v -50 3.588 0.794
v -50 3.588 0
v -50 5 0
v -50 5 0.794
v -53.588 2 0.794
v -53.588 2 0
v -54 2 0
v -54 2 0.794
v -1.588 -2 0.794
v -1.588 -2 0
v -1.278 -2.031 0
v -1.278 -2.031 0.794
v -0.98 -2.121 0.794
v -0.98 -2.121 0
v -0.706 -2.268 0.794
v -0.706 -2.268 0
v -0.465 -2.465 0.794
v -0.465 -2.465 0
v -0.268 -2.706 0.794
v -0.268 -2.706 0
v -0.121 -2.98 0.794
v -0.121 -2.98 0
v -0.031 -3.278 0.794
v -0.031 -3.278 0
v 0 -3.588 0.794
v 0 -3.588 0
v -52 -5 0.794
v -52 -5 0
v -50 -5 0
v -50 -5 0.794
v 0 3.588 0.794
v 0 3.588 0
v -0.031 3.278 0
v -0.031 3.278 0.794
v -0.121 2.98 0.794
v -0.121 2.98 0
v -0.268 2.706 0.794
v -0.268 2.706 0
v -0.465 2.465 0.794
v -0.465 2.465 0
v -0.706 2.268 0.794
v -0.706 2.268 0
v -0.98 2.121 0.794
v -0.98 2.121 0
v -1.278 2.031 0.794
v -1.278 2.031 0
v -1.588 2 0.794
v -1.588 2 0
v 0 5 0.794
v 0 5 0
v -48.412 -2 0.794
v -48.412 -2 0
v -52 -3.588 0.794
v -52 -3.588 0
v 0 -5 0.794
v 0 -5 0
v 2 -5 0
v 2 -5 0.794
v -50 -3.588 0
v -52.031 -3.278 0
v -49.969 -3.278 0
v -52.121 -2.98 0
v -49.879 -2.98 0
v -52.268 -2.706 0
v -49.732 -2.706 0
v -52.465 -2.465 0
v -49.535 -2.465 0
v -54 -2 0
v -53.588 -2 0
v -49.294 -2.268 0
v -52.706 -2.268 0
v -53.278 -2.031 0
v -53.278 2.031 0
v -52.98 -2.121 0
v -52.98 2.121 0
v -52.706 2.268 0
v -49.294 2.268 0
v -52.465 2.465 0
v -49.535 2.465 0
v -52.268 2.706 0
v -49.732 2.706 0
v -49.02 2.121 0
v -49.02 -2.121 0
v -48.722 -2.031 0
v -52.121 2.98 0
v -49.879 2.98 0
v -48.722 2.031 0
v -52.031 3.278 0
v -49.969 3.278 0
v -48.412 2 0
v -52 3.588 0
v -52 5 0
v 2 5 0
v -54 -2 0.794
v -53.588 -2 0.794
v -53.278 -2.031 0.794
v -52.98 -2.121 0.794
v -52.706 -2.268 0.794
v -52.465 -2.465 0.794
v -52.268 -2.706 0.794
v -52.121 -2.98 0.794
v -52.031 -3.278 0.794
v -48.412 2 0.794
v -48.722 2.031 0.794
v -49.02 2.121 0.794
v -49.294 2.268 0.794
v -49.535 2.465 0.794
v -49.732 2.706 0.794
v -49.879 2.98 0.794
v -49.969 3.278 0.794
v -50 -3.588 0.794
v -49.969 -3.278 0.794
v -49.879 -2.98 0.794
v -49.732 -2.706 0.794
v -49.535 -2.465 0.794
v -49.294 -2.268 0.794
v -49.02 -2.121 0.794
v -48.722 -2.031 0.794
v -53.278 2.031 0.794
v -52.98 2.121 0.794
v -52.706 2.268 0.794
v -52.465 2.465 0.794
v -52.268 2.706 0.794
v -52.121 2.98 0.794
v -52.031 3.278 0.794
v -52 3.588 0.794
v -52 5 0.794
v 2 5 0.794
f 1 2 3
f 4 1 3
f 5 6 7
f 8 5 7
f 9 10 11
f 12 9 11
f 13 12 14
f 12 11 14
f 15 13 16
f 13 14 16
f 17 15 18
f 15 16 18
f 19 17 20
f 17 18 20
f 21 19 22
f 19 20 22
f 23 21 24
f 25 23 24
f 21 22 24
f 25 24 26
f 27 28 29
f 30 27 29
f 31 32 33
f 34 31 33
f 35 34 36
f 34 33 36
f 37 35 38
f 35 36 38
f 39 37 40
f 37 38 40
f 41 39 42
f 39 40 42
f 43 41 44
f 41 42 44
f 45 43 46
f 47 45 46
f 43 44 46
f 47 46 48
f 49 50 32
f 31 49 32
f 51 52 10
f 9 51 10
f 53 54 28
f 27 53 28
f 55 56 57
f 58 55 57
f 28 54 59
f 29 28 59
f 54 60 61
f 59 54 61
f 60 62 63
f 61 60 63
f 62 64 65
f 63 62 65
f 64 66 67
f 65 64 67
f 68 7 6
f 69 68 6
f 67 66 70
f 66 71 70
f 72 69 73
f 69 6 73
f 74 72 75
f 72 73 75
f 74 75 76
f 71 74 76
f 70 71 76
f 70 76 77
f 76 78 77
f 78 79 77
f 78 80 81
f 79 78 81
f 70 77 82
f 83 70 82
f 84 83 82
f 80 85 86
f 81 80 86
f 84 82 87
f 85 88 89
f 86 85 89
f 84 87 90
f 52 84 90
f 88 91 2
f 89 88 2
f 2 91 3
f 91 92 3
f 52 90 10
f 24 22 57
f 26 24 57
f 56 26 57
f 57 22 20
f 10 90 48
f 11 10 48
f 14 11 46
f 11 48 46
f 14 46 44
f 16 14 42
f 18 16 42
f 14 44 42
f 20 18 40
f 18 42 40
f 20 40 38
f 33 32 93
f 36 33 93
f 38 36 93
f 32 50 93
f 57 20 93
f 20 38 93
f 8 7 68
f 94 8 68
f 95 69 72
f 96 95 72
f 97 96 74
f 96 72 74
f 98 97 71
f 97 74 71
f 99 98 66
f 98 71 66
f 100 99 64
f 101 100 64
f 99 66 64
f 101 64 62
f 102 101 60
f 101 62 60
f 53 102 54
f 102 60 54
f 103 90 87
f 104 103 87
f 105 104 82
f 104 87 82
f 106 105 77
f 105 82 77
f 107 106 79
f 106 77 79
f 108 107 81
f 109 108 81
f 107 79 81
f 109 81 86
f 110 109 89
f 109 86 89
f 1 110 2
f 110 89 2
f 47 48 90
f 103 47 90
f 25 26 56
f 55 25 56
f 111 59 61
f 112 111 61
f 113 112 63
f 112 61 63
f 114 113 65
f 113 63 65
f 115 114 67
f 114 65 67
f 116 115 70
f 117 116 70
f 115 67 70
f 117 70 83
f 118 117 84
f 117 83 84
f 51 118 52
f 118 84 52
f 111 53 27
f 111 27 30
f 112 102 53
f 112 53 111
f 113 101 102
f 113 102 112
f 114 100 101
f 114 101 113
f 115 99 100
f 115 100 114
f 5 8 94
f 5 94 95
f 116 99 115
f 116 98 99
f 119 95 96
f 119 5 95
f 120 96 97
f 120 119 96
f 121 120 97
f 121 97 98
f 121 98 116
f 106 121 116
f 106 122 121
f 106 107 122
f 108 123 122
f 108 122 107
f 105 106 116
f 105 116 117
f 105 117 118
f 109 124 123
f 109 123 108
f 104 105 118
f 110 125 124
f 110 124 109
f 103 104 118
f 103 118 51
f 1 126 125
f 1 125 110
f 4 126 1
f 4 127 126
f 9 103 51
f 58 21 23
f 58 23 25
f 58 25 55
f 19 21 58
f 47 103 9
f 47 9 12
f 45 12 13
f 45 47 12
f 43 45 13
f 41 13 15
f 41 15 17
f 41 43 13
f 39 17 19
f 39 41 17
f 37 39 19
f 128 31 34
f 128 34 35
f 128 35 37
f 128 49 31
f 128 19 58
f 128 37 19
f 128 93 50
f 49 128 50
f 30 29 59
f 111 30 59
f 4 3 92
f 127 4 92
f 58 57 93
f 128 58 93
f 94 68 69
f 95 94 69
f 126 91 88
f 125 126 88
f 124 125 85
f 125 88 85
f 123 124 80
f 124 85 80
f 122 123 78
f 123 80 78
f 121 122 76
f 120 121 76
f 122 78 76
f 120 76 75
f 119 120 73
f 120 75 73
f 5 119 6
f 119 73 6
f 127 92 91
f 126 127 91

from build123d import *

# Parameters (mm, degrees)
F1_DEPTH = 0.79375


# Not quite as in the source:
# - a length typed as a fraction of an inch, garbled in the dataset ("3 / 203.2 mm" for 3/8 in), is restored


with BuildPart() as f1:
    # F0 (on Top) → F1 (new body)
    with BuildSketch(Plane.XY):
        with BuildLine():
            ThreePointArc((0, 3.5875), (-0.4649679849, 2.4649679849), (-1.5875, 2))
            Line((-1.5875, 2), (-48.4125, 2))
            ThreePointArc((-48.4125, 2), (-49.5350320151, 2.4649679849), (-50, 3.5875))
            Line((-50, 3.5875), (-50, 5))
            Line((-50, 5), (-52, 5))
            Line((-52, 5), (-52, 3.5875))
            ThreePointArc((-52, 3.5875), (-52.4649679849, 2.4649679849), (-53.5875, 2))
            Line((-53.5875, 2), (-54, 2))
            Line((-54, 2), (-54, -2))
            Line((-54, -2), (-53.5875, -2))
            ThreePointArc((-53.5875, -2), (-52.4649679849, -2.4649679849), (-52, -3.5875))
            Line((-52, -3.5875), (-52, -5))
            Line((-52, -5), (-50, -5))
            Line((-50, -5), (-50, -3.5875))
            ThreePointArc((-50, -3.5875), (-49.5350320151, -2.4649679849), (-48.4125, -2))
            Line((-48.4125, -2), (-1.5875, -2))
            ThreePointArc((-1.5875, -2), (-0.4649679849, -2.4649679849), (0, -3.5875))
            Line((0, -3.5875), (0, -5))
            Line((0, -5), (2, -5))
            Line((2, -5), (2, 5))
            Line((2, 5), (0, 5))
            Line((0, 5), (0, 3.5875))
        make_face()
    extrude(amount=F1_DEPTH)


solid = f1.part
